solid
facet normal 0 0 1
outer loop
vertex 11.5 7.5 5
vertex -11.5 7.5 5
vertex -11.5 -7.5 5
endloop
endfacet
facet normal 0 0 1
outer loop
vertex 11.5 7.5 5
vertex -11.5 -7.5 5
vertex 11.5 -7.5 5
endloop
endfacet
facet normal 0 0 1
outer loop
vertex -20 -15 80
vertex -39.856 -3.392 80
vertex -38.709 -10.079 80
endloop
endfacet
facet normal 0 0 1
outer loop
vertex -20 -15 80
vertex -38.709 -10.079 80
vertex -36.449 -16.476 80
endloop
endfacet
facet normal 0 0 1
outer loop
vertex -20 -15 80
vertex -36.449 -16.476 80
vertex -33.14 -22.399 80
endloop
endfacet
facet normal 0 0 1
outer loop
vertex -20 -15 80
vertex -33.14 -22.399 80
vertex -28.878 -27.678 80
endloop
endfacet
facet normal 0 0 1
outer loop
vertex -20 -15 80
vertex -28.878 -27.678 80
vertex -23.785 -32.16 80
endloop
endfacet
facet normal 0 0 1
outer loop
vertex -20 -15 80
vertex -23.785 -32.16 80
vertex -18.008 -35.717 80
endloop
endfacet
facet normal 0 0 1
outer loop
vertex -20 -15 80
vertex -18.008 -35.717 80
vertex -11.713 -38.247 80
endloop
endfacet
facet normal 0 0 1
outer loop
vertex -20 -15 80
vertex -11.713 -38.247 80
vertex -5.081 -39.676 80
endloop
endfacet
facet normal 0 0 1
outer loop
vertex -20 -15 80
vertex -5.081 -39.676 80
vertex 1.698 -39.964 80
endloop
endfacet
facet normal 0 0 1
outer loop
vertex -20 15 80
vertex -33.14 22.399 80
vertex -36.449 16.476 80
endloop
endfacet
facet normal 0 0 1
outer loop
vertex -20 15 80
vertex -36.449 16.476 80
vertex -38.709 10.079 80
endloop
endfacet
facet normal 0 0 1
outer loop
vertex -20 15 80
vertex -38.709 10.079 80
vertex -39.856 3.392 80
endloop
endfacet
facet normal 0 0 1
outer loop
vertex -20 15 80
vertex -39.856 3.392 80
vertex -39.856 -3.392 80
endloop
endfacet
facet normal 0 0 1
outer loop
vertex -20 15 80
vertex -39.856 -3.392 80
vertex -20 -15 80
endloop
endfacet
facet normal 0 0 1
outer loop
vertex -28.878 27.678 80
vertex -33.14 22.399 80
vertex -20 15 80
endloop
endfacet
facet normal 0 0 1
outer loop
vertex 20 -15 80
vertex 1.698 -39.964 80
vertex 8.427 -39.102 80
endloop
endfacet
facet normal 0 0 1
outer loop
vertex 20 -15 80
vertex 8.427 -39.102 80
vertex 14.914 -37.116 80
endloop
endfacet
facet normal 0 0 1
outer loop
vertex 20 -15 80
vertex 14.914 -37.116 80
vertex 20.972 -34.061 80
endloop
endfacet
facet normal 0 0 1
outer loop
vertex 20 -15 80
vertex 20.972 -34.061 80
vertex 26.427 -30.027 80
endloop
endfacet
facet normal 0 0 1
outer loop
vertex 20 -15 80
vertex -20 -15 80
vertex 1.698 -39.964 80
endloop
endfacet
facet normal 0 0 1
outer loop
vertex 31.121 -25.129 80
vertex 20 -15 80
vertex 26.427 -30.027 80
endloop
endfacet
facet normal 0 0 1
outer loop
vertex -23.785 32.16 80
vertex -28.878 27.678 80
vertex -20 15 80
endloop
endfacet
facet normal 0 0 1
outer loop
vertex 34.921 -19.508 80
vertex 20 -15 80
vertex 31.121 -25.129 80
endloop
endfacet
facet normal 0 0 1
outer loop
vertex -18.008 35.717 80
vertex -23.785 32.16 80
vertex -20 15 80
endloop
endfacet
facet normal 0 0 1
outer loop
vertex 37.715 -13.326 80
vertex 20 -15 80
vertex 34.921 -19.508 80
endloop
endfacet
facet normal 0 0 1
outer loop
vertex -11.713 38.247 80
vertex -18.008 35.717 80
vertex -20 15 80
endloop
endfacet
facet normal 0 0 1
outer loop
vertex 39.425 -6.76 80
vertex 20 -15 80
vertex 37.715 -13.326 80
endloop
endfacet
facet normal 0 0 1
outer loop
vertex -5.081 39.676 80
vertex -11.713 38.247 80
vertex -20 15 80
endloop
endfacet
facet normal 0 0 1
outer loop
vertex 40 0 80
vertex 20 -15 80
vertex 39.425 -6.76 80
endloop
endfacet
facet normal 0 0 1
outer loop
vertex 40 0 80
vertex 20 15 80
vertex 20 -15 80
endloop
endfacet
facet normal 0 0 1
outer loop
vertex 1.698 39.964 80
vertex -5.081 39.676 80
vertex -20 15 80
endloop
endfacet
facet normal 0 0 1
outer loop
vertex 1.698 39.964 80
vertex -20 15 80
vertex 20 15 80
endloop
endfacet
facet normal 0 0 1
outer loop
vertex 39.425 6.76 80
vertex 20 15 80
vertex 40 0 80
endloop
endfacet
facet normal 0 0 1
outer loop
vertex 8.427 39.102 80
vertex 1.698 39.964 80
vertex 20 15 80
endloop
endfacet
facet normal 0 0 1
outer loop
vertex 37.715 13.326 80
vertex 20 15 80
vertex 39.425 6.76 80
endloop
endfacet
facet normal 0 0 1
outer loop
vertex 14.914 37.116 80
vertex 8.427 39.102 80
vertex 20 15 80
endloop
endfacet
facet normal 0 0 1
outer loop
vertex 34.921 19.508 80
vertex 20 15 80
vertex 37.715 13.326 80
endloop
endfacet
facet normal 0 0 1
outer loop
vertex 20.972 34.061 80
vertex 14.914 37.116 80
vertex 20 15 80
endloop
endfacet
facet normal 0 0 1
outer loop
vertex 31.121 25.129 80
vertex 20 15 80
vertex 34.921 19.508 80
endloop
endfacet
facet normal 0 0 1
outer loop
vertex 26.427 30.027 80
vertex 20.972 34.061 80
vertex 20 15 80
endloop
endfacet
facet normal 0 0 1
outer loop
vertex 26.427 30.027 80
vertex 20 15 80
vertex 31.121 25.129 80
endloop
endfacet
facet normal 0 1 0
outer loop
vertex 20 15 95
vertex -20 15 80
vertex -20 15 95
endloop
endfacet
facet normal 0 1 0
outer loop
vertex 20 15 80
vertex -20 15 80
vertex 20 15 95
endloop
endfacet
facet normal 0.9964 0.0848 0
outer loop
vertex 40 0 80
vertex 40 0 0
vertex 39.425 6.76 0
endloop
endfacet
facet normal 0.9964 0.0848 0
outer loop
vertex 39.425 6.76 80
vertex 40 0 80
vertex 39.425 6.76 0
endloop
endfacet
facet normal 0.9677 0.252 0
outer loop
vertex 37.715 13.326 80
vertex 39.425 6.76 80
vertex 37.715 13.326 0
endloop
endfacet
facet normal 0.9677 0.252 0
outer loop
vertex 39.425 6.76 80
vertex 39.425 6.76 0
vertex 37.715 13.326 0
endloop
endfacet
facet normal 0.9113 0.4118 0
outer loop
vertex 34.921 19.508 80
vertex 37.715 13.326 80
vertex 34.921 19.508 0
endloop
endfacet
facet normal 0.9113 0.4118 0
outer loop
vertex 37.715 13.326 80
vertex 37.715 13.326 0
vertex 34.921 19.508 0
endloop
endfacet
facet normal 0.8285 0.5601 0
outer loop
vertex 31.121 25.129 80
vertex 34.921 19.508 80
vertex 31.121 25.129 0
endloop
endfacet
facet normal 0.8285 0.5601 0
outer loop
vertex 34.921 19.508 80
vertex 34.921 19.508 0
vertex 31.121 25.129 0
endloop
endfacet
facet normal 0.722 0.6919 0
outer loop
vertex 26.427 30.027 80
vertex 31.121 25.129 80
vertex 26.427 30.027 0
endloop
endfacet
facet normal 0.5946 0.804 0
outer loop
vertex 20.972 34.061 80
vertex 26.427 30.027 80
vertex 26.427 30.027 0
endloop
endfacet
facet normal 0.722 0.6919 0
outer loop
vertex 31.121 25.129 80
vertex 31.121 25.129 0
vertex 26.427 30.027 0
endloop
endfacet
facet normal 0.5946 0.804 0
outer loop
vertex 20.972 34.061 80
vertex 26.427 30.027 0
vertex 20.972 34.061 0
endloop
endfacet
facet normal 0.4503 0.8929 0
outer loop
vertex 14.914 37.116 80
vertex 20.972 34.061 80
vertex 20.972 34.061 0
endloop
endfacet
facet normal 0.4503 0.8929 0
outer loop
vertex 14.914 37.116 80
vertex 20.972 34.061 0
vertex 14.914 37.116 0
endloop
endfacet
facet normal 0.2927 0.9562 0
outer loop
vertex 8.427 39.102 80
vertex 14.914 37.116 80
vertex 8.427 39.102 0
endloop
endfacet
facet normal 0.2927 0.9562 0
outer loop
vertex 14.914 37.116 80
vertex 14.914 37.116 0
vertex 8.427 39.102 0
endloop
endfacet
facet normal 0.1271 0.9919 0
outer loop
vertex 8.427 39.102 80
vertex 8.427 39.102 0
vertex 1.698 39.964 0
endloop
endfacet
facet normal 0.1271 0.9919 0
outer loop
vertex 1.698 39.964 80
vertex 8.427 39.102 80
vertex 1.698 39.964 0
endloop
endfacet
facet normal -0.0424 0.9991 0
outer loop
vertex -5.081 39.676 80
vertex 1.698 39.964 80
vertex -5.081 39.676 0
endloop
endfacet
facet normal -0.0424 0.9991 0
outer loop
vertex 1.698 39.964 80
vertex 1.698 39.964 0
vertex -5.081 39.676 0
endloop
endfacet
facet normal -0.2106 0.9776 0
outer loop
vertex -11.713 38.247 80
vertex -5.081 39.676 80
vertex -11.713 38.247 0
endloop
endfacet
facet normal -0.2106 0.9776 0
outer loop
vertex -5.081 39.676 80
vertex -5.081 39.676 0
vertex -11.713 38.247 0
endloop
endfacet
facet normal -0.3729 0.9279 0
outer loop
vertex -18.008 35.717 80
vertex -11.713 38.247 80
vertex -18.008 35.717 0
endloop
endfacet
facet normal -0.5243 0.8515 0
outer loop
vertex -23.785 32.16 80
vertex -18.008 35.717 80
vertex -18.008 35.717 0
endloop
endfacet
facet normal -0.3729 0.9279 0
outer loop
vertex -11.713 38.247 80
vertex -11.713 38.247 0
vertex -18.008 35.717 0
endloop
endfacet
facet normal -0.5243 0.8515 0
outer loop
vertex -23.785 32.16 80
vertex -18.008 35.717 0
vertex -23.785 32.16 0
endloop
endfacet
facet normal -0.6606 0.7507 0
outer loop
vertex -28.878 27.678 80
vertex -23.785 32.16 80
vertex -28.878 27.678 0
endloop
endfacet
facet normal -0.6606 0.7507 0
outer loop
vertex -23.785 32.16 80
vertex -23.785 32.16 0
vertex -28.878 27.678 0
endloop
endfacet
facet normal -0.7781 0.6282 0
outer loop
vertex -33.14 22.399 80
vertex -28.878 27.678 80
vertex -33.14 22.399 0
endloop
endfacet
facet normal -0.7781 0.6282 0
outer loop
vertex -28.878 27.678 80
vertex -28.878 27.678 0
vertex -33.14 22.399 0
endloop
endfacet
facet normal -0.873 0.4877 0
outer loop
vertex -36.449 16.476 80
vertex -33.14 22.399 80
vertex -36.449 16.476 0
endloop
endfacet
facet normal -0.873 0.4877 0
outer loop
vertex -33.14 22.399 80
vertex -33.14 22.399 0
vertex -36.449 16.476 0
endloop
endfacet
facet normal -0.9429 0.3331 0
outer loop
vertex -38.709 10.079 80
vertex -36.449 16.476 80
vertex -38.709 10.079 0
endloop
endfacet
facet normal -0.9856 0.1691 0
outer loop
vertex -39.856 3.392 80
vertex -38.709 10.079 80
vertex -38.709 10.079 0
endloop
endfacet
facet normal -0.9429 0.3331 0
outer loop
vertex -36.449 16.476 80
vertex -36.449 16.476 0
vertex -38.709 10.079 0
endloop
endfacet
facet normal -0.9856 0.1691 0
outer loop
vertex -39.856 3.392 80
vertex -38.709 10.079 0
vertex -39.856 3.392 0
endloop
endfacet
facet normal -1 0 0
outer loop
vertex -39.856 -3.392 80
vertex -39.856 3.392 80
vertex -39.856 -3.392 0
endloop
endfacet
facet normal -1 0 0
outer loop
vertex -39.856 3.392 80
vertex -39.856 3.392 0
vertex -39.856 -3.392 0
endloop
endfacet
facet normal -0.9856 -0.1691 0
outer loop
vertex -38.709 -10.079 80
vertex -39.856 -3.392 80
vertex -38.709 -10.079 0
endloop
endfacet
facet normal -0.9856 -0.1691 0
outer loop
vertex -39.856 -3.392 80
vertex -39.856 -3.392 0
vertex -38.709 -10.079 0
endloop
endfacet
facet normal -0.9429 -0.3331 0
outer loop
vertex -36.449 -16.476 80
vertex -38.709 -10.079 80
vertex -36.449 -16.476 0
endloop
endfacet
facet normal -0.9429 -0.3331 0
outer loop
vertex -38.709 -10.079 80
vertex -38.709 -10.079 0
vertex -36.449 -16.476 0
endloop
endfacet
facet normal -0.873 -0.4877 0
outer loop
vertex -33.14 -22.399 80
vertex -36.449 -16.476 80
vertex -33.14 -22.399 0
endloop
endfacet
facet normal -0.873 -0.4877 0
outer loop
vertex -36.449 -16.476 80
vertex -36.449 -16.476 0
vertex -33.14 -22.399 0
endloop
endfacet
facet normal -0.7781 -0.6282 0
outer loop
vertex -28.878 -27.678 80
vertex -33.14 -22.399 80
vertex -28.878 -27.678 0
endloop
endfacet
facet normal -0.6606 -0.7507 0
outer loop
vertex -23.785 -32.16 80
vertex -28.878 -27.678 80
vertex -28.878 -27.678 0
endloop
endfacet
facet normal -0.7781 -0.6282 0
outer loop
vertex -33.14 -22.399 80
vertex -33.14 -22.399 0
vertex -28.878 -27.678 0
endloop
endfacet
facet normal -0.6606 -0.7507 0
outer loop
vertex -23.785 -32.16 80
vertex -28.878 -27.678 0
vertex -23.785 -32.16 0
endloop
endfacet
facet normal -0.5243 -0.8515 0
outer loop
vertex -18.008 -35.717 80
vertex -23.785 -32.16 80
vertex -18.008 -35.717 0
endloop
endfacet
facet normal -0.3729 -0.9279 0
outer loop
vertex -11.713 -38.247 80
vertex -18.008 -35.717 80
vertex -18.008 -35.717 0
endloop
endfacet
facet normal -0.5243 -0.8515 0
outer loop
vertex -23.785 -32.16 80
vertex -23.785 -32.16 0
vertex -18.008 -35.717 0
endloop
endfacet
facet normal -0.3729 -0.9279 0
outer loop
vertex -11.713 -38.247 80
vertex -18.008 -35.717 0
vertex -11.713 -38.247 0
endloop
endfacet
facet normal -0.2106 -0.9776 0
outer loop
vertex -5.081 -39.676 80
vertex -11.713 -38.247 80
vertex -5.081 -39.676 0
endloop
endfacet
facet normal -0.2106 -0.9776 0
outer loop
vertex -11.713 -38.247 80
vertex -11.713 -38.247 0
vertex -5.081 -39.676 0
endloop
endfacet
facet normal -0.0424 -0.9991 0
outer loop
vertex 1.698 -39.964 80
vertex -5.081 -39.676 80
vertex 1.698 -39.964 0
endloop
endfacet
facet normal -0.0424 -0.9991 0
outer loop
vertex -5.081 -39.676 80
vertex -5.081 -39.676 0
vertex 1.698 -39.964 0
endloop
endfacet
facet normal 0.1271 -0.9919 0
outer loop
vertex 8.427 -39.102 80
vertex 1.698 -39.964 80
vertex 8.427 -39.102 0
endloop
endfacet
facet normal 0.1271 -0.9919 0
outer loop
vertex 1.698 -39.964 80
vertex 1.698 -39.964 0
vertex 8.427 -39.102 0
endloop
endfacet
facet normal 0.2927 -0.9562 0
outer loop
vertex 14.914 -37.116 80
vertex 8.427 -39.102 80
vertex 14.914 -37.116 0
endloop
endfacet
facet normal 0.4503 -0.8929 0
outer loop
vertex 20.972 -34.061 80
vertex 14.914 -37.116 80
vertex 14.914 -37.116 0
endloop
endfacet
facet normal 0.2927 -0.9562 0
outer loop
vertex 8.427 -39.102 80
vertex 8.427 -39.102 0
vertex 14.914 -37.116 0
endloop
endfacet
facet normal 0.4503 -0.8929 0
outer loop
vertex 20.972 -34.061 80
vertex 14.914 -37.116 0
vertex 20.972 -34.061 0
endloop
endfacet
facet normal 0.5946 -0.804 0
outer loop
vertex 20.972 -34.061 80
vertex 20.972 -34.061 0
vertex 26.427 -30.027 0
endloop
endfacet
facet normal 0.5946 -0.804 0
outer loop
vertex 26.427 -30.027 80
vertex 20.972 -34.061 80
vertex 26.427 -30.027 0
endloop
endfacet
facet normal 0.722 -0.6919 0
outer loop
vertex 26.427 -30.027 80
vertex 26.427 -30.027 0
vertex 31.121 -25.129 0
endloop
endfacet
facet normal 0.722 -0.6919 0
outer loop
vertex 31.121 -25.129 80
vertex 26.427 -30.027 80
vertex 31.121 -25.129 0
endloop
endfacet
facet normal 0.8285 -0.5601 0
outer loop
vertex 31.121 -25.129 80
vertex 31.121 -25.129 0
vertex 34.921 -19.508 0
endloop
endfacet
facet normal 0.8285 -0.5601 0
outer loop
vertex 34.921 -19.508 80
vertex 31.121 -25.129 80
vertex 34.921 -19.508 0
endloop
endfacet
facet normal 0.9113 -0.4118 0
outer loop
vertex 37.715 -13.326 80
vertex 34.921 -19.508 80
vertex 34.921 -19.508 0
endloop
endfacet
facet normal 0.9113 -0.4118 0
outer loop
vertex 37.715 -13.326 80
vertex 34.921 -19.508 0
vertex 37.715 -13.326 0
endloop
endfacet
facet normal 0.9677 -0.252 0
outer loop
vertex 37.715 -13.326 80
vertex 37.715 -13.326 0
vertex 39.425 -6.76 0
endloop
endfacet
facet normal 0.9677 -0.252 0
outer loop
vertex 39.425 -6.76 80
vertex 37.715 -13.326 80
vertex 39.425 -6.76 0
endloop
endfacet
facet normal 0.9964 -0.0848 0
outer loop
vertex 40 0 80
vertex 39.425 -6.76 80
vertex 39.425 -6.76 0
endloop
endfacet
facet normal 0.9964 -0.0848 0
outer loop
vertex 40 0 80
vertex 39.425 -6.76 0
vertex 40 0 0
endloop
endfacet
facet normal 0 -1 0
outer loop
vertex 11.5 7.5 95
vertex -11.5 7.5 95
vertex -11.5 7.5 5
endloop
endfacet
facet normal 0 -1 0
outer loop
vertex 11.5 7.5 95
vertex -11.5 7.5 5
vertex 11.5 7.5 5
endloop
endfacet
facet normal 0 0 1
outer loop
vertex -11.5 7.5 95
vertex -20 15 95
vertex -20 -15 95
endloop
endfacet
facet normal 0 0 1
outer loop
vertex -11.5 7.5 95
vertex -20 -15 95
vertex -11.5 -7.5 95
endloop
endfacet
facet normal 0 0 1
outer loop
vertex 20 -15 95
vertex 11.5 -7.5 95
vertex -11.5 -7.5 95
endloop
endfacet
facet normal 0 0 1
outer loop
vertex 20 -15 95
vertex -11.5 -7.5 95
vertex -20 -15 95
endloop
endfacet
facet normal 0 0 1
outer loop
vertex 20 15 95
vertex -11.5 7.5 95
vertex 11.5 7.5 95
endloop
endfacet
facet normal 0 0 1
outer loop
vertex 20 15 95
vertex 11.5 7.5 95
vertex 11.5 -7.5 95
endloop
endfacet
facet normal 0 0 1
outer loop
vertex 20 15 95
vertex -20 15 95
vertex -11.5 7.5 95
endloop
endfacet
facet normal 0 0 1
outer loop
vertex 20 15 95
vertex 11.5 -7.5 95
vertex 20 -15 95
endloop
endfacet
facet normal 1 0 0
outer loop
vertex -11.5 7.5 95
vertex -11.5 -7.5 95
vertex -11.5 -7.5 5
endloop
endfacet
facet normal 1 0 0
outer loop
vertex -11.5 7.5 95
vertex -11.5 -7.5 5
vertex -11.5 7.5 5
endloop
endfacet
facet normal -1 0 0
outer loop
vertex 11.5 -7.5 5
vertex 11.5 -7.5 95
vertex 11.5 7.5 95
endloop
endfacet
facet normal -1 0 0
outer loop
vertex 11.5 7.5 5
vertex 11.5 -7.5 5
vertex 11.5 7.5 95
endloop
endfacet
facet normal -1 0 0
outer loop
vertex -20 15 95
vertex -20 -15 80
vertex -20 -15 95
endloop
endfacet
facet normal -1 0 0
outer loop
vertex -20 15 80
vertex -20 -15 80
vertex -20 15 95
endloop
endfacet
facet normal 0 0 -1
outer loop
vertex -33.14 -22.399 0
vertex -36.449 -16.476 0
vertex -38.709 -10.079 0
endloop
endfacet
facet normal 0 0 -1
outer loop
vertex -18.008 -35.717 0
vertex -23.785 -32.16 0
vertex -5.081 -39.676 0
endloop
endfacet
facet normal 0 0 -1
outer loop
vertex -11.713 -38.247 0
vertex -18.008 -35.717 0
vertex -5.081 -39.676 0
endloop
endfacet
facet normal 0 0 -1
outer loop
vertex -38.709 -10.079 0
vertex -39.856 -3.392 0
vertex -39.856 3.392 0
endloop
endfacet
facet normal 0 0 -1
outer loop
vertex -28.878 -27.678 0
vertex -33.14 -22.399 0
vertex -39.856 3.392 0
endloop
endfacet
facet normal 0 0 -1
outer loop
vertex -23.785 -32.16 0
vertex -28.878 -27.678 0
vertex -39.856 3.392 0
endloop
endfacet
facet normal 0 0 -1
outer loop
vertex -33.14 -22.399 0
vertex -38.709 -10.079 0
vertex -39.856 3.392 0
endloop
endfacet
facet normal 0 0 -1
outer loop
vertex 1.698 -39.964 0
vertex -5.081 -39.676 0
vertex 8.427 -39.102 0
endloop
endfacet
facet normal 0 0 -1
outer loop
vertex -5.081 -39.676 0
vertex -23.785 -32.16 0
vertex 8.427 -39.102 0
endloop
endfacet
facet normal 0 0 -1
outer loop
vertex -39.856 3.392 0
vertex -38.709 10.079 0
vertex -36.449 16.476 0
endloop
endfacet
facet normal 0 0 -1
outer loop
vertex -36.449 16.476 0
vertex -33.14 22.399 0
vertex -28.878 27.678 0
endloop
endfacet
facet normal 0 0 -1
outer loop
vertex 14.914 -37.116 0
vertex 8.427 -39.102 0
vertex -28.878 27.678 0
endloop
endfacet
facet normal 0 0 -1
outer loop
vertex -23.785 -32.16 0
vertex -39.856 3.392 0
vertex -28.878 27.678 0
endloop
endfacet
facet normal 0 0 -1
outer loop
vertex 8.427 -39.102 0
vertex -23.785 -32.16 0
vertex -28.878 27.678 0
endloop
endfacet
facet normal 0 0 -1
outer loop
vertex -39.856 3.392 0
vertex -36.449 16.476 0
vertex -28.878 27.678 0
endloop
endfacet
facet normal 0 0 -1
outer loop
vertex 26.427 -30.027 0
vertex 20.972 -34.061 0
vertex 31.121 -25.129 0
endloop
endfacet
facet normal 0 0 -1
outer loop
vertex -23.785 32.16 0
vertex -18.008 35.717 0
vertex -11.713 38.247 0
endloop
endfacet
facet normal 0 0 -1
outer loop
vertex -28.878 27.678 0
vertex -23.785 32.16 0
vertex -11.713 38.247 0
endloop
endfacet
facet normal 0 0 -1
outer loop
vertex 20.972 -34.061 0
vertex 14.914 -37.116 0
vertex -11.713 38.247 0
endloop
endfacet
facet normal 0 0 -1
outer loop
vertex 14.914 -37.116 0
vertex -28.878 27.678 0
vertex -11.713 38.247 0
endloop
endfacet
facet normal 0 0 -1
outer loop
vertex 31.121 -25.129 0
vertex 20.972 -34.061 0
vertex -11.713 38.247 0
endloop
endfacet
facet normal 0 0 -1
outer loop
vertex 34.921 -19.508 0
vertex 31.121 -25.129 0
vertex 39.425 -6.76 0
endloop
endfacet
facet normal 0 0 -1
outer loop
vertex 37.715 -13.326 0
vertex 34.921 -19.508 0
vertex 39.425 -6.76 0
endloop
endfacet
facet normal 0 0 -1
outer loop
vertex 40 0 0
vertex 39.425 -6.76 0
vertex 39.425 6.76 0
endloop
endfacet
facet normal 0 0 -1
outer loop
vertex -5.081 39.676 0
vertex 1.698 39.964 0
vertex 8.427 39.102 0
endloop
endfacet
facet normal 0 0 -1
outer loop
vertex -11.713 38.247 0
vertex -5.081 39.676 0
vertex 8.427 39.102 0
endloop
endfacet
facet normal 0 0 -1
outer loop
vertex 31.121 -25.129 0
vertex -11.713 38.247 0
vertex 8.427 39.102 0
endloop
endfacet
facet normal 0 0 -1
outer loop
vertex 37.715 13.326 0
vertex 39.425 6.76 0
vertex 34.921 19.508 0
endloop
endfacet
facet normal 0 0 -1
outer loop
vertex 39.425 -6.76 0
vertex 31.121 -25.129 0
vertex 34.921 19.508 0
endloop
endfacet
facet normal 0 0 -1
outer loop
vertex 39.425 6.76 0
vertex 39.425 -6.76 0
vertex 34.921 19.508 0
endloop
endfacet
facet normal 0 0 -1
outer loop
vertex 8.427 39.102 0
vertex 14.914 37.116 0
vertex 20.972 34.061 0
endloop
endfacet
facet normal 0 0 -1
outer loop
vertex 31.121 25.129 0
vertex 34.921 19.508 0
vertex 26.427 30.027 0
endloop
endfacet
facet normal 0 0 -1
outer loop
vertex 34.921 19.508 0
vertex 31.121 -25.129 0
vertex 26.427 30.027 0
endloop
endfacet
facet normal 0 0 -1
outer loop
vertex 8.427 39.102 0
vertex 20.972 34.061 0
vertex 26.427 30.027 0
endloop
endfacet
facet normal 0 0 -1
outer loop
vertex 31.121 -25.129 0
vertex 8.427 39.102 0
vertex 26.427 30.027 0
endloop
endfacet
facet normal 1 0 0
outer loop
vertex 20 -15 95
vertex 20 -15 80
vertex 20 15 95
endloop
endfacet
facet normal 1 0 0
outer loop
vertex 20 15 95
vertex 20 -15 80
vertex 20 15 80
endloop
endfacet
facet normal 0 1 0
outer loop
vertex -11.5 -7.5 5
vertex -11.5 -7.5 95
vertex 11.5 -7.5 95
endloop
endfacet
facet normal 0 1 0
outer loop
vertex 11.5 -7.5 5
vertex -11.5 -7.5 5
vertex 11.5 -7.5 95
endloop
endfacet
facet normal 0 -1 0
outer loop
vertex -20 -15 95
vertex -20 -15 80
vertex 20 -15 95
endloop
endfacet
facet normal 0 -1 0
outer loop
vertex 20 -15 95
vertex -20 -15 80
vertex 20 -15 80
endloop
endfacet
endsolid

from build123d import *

# Parameters (mm, degrees)
F0_R     = 40
F1_DEPTH = 80
F2_W     = 40
F2_H     = 30
F3_DEPTH = 15
F4_W     = 23
F4_H     = 15
F5_DEPTH = 90


with BuildPart() as f1:
    # F0 (on Top) → F1 (new body)
    with BuildSketch(Plane.XY):
        Circle(F0_R)
    extrude(amount=F1_DEPTH)

    # F2 (on face) → F3 (join)
    with BuildSketch(Plane.XY.offset(80)):
        Rectangle(F2_W, F2_H)
    extrude(amount=F3_DEPTH)

    # F4 (on face) → F5 (cut)
    with BuildSketch(Plane.XY.offset(95)):
        Rectangle(F4_W, F4_H)
    extrude(amount=-F5_DEPTH, mode=Mode.SUBTRACT)


solid = f1.part
